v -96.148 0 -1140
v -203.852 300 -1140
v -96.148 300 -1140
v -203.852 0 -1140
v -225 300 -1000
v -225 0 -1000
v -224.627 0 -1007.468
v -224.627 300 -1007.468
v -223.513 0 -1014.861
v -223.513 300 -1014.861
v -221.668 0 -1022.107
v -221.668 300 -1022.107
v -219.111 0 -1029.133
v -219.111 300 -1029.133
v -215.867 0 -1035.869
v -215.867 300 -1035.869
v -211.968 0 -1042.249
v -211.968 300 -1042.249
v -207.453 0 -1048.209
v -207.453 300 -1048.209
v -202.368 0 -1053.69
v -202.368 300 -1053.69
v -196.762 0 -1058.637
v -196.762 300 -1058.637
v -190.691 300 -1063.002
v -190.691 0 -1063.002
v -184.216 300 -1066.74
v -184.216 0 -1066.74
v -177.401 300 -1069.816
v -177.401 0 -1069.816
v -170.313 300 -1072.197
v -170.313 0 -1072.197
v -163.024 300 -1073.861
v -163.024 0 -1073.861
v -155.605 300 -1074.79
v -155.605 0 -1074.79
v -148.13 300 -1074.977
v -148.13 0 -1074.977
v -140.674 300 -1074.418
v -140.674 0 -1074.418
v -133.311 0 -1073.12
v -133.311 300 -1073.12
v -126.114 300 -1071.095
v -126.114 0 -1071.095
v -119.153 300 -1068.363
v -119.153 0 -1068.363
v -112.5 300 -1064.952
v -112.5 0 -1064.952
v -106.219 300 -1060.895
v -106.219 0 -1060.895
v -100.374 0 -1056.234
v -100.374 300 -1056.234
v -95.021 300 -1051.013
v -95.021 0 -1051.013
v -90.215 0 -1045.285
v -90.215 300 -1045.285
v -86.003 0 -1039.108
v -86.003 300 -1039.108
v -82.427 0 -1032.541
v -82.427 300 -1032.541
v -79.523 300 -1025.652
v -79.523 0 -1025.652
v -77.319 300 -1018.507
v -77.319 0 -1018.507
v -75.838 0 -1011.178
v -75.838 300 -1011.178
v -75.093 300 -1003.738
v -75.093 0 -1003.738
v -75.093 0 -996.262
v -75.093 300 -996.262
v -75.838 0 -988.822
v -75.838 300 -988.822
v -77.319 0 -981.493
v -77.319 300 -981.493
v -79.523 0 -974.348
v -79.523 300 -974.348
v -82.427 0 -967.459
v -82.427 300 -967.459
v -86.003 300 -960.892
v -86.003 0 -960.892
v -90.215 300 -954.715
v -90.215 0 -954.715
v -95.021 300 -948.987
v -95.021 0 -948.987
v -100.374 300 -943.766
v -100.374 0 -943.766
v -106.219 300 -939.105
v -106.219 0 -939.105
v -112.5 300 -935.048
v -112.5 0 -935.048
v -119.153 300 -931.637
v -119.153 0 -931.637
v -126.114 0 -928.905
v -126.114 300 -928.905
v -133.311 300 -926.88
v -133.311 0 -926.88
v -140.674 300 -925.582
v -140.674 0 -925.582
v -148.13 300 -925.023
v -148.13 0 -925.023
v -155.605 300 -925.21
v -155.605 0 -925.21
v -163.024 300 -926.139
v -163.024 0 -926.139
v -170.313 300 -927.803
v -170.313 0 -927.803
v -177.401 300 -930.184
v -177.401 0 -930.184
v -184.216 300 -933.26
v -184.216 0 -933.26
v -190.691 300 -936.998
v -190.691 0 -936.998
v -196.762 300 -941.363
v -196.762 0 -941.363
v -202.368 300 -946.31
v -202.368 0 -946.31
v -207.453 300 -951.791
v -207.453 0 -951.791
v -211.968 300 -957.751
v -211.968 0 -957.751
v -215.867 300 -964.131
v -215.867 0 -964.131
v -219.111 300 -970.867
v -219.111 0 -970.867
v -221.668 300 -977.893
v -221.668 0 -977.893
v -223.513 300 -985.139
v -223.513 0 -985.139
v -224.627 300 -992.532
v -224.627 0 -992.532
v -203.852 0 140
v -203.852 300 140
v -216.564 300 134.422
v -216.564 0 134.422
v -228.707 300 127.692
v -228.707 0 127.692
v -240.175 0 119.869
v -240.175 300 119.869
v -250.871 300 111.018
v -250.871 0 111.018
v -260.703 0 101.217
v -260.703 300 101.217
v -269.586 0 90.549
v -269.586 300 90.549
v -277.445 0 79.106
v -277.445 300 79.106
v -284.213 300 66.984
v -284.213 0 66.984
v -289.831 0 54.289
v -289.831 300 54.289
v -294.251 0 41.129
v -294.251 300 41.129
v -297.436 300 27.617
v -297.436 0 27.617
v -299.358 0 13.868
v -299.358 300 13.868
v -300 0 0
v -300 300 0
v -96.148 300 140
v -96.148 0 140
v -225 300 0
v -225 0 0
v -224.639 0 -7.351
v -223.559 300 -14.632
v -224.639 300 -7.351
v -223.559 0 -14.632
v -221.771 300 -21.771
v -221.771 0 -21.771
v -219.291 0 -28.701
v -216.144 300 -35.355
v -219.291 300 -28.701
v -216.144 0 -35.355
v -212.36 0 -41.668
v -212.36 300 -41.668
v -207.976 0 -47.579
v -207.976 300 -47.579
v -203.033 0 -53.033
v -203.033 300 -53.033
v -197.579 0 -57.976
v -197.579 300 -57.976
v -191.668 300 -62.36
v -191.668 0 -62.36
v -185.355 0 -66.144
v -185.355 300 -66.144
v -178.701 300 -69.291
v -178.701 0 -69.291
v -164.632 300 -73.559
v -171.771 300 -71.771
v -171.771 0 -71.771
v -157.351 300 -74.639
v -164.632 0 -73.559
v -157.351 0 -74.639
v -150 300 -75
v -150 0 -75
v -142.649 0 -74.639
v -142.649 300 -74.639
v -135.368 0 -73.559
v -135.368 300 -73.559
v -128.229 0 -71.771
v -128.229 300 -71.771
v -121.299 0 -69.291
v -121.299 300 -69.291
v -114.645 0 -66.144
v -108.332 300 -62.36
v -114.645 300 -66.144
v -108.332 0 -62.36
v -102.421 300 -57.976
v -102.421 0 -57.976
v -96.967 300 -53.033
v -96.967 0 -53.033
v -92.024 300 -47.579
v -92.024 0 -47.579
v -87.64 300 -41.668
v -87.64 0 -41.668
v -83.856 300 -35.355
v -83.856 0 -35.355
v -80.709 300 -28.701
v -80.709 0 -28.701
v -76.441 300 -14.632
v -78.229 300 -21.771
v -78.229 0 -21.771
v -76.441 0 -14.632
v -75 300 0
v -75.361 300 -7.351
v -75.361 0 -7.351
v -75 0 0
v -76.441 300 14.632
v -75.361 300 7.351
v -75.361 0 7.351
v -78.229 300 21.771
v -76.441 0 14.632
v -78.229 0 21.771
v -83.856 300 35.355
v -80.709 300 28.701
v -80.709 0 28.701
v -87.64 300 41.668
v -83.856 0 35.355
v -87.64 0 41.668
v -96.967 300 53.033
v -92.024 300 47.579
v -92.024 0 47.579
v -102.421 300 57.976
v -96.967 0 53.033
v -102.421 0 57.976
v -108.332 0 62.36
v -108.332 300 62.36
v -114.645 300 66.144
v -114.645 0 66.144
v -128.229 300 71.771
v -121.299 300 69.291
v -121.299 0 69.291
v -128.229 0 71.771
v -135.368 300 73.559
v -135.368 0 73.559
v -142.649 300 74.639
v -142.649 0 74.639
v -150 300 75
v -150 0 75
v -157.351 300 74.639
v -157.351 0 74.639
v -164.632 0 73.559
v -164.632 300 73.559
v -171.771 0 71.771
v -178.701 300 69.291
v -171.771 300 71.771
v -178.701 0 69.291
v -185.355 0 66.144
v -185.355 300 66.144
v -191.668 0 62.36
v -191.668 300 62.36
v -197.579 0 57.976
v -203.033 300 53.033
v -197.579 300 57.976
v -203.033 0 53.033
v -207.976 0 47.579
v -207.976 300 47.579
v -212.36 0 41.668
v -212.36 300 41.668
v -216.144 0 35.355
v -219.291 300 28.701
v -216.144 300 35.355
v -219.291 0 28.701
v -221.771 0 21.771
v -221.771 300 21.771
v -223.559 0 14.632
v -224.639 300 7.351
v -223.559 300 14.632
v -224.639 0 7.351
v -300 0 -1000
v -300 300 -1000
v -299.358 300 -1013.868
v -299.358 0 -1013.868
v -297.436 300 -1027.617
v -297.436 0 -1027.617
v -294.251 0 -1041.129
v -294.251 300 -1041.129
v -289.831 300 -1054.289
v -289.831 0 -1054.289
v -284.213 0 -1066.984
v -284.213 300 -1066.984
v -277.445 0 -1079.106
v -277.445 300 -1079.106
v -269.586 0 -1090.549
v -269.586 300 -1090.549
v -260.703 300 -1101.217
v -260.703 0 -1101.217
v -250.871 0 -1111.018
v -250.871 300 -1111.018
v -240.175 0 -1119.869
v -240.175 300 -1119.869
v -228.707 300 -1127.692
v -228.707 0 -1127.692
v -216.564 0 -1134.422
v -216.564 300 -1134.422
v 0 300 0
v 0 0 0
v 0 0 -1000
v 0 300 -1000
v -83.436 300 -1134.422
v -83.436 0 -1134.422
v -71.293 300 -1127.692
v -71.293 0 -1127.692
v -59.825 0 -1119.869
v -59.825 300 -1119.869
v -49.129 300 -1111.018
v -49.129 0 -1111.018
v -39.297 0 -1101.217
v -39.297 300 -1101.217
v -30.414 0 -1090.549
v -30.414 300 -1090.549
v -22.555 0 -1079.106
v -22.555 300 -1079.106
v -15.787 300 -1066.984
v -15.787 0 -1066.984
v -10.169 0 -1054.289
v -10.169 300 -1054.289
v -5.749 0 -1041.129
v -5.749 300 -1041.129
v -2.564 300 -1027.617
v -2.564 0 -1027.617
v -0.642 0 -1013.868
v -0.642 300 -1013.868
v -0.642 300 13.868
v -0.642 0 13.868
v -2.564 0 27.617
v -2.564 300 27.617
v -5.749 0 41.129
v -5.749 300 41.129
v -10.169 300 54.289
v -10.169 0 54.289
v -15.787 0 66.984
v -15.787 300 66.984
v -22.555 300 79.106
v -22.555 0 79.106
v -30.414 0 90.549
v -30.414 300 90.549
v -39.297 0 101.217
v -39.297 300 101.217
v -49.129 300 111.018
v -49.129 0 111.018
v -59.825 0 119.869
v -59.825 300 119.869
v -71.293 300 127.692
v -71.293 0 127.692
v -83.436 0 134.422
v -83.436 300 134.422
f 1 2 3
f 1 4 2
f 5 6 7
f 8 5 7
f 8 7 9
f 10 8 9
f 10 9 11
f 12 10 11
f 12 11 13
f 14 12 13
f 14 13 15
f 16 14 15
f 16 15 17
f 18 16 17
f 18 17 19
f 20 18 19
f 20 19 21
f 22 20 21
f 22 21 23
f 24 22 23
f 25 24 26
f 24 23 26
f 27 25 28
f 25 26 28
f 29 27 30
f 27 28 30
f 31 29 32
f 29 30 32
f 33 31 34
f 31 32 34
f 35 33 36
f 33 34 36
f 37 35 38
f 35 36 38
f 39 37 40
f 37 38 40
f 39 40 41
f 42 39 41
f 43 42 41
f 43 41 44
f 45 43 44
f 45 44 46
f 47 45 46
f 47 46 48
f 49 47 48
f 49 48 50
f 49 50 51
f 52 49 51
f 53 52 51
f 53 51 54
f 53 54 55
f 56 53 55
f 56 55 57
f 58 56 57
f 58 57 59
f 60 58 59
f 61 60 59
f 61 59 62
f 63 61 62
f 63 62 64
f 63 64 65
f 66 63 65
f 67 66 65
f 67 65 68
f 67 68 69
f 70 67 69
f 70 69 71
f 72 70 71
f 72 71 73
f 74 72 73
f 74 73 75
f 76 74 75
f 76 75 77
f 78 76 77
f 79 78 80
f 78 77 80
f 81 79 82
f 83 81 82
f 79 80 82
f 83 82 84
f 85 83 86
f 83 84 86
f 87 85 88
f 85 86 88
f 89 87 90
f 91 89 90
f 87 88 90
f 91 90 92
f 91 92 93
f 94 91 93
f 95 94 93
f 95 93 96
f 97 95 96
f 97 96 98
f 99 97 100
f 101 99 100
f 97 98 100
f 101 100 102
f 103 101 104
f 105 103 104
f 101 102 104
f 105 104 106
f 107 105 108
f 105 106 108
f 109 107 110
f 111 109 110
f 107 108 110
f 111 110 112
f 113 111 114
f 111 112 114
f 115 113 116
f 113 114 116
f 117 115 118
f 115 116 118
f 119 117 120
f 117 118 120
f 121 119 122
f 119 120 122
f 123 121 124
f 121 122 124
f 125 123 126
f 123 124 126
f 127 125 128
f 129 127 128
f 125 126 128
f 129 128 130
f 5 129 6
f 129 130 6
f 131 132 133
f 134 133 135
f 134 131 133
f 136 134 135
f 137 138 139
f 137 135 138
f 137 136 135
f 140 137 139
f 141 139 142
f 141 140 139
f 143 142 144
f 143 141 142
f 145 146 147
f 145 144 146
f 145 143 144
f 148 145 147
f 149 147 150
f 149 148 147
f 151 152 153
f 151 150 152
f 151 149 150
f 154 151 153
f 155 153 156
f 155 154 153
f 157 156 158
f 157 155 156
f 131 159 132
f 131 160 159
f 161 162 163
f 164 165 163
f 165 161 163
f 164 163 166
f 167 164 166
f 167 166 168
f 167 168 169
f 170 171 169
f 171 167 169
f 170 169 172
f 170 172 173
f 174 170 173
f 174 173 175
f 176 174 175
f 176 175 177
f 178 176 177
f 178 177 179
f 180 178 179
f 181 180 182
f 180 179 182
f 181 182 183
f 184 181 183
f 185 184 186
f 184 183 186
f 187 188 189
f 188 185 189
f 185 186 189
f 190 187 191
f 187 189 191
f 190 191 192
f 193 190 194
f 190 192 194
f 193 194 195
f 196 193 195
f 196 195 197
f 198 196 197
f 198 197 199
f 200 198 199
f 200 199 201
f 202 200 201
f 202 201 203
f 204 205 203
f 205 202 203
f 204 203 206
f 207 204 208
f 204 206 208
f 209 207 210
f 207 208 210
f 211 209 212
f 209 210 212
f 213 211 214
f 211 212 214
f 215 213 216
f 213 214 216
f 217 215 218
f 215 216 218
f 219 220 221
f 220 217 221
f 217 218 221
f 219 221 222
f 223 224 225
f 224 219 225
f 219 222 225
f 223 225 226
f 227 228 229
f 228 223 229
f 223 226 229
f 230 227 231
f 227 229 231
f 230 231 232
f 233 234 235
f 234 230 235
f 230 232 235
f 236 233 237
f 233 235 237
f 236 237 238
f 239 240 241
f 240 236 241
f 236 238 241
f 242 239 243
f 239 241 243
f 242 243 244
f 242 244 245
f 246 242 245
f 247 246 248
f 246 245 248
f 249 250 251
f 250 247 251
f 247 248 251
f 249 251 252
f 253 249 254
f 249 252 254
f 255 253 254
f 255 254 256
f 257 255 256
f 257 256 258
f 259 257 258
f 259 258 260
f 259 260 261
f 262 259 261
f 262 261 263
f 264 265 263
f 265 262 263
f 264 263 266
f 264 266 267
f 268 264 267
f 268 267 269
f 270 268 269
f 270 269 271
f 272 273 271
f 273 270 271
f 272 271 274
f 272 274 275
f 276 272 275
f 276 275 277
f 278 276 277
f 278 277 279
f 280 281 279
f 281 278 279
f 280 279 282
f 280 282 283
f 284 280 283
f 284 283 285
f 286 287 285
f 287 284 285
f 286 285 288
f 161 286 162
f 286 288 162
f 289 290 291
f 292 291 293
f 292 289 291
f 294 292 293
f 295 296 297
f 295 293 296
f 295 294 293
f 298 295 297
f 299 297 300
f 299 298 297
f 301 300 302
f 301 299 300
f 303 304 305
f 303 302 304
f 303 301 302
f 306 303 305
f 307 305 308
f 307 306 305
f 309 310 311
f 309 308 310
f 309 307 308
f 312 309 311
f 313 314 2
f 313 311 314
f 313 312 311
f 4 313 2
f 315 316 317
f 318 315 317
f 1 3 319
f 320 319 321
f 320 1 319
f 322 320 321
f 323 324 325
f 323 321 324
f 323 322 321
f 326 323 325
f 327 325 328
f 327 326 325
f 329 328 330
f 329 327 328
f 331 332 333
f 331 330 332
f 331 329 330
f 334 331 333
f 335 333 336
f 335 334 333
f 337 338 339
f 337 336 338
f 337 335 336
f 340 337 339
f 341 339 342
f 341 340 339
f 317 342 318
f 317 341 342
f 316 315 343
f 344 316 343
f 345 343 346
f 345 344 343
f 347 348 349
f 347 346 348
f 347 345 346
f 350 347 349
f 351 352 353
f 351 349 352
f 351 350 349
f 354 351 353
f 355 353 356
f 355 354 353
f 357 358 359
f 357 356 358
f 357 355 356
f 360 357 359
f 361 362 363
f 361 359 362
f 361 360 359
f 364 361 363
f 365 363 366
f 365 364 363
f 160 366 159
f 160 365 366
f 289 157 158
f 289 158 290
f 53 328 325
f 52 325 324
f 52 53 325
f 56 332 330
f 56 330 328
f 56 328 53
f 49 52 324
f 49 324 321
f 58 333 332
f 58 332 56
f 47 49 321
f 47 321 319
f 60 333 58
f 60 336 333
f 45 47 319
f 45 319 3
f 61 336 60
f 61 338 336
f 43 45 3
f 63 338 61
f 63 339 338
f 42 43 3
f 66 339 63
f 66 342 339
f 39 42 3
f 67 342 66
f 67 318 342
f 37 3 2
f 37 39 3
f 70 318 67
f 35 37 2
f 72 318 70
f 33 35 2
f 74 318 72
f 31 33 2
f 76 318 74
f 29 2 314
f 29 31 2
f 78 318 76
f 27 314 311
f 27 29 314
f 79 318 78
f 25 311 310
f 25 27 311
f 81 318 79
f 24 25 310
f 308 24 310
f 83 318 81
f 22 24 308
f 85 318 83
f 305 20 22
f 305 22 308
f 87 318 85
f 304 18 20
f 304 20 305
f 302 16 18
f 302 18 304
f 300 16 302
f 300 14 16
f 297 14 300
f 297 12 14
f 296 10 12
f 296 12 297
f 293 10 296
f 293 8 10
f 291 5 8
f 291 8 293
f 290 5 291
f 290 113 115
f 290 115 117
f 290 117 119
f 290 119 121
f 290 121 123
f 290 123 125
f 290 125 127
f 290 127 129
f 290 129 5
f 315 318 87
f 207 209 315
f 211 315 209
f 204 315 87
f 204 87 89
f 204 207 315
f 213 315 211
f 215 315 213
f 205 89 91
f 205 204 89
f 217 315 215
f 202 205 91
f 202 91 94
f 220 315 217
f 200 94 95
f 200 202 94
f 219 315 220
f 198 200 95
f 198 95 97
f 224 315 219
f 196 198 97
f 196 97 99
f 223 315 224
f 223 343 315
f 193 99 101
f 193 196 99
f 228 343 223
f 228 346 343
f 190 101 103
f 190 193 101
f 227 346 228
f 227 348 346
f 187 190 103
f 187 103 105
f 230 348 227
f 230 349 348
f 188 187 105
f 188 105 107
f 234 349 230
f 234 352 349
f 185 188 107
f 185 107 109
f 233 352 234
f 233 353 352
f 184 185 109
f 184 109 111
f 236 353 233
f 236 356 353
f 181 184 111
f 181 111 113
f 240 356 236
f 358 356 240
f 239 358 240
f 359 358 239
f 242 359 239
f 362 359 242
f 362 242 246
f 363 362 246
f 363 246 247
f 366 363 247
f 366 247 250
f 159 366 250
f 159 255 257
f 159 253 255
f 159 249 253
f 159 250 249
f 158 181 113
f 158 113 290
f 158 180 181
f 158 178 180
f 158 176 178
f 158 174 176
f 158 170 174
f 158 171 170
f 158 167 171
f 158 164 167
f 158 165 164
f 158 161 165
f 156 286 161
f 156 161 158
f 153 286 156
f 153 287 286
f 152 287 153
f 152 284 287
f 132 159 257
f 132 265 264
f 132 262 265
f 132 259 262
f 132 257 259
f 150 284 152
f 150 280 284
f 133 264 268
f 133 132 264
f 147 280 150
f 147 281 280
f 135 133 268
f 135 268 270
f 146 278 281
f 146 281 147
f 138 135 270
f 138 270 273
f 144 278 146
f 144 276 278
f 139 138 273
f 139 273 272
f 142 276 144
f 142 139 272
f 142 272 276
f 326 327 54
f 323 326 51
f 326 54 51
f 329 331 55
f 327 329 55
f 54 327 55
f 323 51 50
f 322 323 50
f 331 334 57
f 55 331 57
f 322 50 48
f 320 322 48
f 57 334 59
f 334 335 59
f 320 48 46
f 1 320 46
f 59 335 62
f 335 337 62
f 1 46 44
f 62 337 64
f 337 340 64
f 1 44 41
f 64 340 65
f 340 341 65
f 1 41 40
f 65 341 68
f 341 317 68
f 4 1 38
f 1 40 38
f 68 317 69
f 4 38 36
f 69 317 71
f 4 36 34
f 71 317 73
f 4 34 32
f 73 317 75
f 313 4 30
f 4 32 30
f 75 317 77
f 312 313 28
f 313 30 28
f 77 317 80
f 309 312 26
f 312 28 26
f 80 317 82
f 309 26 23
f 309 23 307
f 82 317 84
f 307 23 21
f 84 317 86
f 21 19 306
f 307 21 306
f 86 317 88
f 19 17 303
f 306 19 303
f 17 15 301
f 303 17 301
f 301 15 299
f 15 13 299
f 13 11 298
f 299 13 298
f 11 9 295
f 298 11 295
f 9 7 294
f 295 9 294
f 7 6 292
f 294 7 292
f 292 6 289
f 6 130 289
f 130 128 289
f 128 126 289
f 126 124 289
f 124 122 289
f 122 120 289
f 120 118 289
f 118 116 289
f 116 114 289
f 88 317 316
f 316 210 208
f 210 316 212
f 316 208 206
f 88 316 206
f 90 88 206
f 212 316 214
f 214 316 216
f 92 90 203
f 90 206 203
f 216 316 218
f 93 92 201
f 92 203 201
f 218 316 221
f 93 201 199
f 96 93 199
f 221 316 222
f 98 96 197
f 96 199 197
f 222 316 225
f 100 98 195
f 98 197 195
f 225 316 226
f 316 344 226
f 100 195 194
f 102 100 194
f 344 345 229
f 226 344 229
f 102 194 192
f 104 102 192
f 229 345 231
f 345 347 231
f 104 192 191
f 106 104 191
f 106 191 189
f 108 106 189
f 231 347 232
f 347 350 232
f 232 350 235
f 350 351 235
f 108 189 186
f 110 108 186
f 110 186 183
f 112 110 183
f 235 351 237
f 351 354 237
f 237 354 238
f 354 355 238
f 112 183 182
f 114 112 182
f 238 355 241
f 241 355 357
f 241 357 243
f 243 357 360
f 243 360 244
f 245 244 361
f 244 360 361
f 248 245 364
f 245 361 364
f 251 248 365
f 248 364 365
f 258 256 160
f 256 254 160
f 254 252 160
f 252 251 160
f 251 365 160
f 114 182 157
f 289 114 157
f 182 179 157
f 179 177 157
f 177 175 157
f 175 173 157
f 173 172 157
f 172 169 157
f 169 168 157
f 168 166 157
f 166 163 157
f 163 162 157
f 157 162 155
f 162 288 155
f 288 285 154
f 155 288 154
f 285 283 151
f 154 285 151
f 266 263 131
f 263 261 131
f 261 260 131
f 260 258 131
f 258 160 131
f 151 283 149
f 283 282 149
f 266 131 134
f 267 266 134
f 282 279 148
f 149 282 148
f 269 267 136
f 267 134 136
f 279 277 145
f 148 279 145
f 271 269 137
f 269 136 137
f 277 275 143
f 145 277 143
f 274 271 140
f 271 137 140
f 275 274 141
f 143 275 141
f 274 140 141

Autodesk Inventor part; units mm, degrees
ref_plane "YZ Plane" through (0, 0, 0) normal (1, 0, 0) x (0, 1, 0)
ref_plane "XZ Plane" through (0, 0, 0) normal (0, 1, 0) x (-1, 0, 0)
ref_plane "XY Plane" through (0, 0, 0) normal (0, 0, 1) x (1, 0, 0)
sketch "Sketch1" plane through (0, 0, 0) normal (0, 1, 0) x (-1, 0, 0)
  line L0 (0, 0) -> (0, -1000)
  line L1 (0, -1000) -> (150, -1000)
  line L2 (150, -1000) -> (150, 0)
  circle A0 centre (150, 0) radius 150
  circle A1 centre (150, -1000) radius 150
  line L3 (300, 0) -> (300, -1000)
  circle A2 centre (150, 0) radius 75
  circle A3 centre (150, -1000) radius 75
  dimension "d0" = 1000
  dimension "d1" = 150
  dimension "d2" = 1000
  dimension "d3" = 150
  dimension "d4" = 150
extrude "Extrusion1" add sketch "Sketch1" along normal blind 300 contours A0 L2 A1 L0 | A0 | A1 L2 A3 L1 | L1 A3 L2 A1 | L3 A1 L2 A0
sketch "Sketch2" plane through (0, 0, 0) normal (0, -1, 0) x (1, 0, 0)
  line L0 (0, 0) -> (-300, 0)
  line L1 (0, 140) -> (-300, 140)
  circle A0 centre (-150, 0) radius 150
  circle A1 centre (-150, -1000) radius 75 projected
  circle A2 centre (-150, -1000) radius 150
  arc A3 (-300, -1000) -> (0, -1000) centre (-150, -1000) ccw projected
  line L2 (-300, -1000) -> (0, -1000)
  line L3 (-300, -1140) -> (0, -1140)
  point P0 (-96.1484, -1140)
  point P1 (-203.8516, -1140)
  point P2 (-203.8516, 140)
  point P3 (-96.1484, 140)
  dimension "d7" = 140
  dimension "d8" = 140
extrude "Extrusion2" cut sketch "Sketch2" against normal through all contours L1 A0 | A2 L3
equation "\"BendRadius\" = Thickness"
equation "\"BendReliefWidth\" = Thickness"
equation "\"BendReliefDepth\" = 0.5 * Thickness"
equation "\"CornerReliefSize\" = 4 * Thickness"
equation "\"MinimumRemnant\" = 2 * Thickness"
equation "\"TransitionRadius\" = BendRadius"
equation "\"JacobiRadiusSize\" = BendRadius"
equation "\"GapSize\" = Thickness"
equation "\"Thickness\" = 0.5"
properties part number "Middle v2" material "Steel"
